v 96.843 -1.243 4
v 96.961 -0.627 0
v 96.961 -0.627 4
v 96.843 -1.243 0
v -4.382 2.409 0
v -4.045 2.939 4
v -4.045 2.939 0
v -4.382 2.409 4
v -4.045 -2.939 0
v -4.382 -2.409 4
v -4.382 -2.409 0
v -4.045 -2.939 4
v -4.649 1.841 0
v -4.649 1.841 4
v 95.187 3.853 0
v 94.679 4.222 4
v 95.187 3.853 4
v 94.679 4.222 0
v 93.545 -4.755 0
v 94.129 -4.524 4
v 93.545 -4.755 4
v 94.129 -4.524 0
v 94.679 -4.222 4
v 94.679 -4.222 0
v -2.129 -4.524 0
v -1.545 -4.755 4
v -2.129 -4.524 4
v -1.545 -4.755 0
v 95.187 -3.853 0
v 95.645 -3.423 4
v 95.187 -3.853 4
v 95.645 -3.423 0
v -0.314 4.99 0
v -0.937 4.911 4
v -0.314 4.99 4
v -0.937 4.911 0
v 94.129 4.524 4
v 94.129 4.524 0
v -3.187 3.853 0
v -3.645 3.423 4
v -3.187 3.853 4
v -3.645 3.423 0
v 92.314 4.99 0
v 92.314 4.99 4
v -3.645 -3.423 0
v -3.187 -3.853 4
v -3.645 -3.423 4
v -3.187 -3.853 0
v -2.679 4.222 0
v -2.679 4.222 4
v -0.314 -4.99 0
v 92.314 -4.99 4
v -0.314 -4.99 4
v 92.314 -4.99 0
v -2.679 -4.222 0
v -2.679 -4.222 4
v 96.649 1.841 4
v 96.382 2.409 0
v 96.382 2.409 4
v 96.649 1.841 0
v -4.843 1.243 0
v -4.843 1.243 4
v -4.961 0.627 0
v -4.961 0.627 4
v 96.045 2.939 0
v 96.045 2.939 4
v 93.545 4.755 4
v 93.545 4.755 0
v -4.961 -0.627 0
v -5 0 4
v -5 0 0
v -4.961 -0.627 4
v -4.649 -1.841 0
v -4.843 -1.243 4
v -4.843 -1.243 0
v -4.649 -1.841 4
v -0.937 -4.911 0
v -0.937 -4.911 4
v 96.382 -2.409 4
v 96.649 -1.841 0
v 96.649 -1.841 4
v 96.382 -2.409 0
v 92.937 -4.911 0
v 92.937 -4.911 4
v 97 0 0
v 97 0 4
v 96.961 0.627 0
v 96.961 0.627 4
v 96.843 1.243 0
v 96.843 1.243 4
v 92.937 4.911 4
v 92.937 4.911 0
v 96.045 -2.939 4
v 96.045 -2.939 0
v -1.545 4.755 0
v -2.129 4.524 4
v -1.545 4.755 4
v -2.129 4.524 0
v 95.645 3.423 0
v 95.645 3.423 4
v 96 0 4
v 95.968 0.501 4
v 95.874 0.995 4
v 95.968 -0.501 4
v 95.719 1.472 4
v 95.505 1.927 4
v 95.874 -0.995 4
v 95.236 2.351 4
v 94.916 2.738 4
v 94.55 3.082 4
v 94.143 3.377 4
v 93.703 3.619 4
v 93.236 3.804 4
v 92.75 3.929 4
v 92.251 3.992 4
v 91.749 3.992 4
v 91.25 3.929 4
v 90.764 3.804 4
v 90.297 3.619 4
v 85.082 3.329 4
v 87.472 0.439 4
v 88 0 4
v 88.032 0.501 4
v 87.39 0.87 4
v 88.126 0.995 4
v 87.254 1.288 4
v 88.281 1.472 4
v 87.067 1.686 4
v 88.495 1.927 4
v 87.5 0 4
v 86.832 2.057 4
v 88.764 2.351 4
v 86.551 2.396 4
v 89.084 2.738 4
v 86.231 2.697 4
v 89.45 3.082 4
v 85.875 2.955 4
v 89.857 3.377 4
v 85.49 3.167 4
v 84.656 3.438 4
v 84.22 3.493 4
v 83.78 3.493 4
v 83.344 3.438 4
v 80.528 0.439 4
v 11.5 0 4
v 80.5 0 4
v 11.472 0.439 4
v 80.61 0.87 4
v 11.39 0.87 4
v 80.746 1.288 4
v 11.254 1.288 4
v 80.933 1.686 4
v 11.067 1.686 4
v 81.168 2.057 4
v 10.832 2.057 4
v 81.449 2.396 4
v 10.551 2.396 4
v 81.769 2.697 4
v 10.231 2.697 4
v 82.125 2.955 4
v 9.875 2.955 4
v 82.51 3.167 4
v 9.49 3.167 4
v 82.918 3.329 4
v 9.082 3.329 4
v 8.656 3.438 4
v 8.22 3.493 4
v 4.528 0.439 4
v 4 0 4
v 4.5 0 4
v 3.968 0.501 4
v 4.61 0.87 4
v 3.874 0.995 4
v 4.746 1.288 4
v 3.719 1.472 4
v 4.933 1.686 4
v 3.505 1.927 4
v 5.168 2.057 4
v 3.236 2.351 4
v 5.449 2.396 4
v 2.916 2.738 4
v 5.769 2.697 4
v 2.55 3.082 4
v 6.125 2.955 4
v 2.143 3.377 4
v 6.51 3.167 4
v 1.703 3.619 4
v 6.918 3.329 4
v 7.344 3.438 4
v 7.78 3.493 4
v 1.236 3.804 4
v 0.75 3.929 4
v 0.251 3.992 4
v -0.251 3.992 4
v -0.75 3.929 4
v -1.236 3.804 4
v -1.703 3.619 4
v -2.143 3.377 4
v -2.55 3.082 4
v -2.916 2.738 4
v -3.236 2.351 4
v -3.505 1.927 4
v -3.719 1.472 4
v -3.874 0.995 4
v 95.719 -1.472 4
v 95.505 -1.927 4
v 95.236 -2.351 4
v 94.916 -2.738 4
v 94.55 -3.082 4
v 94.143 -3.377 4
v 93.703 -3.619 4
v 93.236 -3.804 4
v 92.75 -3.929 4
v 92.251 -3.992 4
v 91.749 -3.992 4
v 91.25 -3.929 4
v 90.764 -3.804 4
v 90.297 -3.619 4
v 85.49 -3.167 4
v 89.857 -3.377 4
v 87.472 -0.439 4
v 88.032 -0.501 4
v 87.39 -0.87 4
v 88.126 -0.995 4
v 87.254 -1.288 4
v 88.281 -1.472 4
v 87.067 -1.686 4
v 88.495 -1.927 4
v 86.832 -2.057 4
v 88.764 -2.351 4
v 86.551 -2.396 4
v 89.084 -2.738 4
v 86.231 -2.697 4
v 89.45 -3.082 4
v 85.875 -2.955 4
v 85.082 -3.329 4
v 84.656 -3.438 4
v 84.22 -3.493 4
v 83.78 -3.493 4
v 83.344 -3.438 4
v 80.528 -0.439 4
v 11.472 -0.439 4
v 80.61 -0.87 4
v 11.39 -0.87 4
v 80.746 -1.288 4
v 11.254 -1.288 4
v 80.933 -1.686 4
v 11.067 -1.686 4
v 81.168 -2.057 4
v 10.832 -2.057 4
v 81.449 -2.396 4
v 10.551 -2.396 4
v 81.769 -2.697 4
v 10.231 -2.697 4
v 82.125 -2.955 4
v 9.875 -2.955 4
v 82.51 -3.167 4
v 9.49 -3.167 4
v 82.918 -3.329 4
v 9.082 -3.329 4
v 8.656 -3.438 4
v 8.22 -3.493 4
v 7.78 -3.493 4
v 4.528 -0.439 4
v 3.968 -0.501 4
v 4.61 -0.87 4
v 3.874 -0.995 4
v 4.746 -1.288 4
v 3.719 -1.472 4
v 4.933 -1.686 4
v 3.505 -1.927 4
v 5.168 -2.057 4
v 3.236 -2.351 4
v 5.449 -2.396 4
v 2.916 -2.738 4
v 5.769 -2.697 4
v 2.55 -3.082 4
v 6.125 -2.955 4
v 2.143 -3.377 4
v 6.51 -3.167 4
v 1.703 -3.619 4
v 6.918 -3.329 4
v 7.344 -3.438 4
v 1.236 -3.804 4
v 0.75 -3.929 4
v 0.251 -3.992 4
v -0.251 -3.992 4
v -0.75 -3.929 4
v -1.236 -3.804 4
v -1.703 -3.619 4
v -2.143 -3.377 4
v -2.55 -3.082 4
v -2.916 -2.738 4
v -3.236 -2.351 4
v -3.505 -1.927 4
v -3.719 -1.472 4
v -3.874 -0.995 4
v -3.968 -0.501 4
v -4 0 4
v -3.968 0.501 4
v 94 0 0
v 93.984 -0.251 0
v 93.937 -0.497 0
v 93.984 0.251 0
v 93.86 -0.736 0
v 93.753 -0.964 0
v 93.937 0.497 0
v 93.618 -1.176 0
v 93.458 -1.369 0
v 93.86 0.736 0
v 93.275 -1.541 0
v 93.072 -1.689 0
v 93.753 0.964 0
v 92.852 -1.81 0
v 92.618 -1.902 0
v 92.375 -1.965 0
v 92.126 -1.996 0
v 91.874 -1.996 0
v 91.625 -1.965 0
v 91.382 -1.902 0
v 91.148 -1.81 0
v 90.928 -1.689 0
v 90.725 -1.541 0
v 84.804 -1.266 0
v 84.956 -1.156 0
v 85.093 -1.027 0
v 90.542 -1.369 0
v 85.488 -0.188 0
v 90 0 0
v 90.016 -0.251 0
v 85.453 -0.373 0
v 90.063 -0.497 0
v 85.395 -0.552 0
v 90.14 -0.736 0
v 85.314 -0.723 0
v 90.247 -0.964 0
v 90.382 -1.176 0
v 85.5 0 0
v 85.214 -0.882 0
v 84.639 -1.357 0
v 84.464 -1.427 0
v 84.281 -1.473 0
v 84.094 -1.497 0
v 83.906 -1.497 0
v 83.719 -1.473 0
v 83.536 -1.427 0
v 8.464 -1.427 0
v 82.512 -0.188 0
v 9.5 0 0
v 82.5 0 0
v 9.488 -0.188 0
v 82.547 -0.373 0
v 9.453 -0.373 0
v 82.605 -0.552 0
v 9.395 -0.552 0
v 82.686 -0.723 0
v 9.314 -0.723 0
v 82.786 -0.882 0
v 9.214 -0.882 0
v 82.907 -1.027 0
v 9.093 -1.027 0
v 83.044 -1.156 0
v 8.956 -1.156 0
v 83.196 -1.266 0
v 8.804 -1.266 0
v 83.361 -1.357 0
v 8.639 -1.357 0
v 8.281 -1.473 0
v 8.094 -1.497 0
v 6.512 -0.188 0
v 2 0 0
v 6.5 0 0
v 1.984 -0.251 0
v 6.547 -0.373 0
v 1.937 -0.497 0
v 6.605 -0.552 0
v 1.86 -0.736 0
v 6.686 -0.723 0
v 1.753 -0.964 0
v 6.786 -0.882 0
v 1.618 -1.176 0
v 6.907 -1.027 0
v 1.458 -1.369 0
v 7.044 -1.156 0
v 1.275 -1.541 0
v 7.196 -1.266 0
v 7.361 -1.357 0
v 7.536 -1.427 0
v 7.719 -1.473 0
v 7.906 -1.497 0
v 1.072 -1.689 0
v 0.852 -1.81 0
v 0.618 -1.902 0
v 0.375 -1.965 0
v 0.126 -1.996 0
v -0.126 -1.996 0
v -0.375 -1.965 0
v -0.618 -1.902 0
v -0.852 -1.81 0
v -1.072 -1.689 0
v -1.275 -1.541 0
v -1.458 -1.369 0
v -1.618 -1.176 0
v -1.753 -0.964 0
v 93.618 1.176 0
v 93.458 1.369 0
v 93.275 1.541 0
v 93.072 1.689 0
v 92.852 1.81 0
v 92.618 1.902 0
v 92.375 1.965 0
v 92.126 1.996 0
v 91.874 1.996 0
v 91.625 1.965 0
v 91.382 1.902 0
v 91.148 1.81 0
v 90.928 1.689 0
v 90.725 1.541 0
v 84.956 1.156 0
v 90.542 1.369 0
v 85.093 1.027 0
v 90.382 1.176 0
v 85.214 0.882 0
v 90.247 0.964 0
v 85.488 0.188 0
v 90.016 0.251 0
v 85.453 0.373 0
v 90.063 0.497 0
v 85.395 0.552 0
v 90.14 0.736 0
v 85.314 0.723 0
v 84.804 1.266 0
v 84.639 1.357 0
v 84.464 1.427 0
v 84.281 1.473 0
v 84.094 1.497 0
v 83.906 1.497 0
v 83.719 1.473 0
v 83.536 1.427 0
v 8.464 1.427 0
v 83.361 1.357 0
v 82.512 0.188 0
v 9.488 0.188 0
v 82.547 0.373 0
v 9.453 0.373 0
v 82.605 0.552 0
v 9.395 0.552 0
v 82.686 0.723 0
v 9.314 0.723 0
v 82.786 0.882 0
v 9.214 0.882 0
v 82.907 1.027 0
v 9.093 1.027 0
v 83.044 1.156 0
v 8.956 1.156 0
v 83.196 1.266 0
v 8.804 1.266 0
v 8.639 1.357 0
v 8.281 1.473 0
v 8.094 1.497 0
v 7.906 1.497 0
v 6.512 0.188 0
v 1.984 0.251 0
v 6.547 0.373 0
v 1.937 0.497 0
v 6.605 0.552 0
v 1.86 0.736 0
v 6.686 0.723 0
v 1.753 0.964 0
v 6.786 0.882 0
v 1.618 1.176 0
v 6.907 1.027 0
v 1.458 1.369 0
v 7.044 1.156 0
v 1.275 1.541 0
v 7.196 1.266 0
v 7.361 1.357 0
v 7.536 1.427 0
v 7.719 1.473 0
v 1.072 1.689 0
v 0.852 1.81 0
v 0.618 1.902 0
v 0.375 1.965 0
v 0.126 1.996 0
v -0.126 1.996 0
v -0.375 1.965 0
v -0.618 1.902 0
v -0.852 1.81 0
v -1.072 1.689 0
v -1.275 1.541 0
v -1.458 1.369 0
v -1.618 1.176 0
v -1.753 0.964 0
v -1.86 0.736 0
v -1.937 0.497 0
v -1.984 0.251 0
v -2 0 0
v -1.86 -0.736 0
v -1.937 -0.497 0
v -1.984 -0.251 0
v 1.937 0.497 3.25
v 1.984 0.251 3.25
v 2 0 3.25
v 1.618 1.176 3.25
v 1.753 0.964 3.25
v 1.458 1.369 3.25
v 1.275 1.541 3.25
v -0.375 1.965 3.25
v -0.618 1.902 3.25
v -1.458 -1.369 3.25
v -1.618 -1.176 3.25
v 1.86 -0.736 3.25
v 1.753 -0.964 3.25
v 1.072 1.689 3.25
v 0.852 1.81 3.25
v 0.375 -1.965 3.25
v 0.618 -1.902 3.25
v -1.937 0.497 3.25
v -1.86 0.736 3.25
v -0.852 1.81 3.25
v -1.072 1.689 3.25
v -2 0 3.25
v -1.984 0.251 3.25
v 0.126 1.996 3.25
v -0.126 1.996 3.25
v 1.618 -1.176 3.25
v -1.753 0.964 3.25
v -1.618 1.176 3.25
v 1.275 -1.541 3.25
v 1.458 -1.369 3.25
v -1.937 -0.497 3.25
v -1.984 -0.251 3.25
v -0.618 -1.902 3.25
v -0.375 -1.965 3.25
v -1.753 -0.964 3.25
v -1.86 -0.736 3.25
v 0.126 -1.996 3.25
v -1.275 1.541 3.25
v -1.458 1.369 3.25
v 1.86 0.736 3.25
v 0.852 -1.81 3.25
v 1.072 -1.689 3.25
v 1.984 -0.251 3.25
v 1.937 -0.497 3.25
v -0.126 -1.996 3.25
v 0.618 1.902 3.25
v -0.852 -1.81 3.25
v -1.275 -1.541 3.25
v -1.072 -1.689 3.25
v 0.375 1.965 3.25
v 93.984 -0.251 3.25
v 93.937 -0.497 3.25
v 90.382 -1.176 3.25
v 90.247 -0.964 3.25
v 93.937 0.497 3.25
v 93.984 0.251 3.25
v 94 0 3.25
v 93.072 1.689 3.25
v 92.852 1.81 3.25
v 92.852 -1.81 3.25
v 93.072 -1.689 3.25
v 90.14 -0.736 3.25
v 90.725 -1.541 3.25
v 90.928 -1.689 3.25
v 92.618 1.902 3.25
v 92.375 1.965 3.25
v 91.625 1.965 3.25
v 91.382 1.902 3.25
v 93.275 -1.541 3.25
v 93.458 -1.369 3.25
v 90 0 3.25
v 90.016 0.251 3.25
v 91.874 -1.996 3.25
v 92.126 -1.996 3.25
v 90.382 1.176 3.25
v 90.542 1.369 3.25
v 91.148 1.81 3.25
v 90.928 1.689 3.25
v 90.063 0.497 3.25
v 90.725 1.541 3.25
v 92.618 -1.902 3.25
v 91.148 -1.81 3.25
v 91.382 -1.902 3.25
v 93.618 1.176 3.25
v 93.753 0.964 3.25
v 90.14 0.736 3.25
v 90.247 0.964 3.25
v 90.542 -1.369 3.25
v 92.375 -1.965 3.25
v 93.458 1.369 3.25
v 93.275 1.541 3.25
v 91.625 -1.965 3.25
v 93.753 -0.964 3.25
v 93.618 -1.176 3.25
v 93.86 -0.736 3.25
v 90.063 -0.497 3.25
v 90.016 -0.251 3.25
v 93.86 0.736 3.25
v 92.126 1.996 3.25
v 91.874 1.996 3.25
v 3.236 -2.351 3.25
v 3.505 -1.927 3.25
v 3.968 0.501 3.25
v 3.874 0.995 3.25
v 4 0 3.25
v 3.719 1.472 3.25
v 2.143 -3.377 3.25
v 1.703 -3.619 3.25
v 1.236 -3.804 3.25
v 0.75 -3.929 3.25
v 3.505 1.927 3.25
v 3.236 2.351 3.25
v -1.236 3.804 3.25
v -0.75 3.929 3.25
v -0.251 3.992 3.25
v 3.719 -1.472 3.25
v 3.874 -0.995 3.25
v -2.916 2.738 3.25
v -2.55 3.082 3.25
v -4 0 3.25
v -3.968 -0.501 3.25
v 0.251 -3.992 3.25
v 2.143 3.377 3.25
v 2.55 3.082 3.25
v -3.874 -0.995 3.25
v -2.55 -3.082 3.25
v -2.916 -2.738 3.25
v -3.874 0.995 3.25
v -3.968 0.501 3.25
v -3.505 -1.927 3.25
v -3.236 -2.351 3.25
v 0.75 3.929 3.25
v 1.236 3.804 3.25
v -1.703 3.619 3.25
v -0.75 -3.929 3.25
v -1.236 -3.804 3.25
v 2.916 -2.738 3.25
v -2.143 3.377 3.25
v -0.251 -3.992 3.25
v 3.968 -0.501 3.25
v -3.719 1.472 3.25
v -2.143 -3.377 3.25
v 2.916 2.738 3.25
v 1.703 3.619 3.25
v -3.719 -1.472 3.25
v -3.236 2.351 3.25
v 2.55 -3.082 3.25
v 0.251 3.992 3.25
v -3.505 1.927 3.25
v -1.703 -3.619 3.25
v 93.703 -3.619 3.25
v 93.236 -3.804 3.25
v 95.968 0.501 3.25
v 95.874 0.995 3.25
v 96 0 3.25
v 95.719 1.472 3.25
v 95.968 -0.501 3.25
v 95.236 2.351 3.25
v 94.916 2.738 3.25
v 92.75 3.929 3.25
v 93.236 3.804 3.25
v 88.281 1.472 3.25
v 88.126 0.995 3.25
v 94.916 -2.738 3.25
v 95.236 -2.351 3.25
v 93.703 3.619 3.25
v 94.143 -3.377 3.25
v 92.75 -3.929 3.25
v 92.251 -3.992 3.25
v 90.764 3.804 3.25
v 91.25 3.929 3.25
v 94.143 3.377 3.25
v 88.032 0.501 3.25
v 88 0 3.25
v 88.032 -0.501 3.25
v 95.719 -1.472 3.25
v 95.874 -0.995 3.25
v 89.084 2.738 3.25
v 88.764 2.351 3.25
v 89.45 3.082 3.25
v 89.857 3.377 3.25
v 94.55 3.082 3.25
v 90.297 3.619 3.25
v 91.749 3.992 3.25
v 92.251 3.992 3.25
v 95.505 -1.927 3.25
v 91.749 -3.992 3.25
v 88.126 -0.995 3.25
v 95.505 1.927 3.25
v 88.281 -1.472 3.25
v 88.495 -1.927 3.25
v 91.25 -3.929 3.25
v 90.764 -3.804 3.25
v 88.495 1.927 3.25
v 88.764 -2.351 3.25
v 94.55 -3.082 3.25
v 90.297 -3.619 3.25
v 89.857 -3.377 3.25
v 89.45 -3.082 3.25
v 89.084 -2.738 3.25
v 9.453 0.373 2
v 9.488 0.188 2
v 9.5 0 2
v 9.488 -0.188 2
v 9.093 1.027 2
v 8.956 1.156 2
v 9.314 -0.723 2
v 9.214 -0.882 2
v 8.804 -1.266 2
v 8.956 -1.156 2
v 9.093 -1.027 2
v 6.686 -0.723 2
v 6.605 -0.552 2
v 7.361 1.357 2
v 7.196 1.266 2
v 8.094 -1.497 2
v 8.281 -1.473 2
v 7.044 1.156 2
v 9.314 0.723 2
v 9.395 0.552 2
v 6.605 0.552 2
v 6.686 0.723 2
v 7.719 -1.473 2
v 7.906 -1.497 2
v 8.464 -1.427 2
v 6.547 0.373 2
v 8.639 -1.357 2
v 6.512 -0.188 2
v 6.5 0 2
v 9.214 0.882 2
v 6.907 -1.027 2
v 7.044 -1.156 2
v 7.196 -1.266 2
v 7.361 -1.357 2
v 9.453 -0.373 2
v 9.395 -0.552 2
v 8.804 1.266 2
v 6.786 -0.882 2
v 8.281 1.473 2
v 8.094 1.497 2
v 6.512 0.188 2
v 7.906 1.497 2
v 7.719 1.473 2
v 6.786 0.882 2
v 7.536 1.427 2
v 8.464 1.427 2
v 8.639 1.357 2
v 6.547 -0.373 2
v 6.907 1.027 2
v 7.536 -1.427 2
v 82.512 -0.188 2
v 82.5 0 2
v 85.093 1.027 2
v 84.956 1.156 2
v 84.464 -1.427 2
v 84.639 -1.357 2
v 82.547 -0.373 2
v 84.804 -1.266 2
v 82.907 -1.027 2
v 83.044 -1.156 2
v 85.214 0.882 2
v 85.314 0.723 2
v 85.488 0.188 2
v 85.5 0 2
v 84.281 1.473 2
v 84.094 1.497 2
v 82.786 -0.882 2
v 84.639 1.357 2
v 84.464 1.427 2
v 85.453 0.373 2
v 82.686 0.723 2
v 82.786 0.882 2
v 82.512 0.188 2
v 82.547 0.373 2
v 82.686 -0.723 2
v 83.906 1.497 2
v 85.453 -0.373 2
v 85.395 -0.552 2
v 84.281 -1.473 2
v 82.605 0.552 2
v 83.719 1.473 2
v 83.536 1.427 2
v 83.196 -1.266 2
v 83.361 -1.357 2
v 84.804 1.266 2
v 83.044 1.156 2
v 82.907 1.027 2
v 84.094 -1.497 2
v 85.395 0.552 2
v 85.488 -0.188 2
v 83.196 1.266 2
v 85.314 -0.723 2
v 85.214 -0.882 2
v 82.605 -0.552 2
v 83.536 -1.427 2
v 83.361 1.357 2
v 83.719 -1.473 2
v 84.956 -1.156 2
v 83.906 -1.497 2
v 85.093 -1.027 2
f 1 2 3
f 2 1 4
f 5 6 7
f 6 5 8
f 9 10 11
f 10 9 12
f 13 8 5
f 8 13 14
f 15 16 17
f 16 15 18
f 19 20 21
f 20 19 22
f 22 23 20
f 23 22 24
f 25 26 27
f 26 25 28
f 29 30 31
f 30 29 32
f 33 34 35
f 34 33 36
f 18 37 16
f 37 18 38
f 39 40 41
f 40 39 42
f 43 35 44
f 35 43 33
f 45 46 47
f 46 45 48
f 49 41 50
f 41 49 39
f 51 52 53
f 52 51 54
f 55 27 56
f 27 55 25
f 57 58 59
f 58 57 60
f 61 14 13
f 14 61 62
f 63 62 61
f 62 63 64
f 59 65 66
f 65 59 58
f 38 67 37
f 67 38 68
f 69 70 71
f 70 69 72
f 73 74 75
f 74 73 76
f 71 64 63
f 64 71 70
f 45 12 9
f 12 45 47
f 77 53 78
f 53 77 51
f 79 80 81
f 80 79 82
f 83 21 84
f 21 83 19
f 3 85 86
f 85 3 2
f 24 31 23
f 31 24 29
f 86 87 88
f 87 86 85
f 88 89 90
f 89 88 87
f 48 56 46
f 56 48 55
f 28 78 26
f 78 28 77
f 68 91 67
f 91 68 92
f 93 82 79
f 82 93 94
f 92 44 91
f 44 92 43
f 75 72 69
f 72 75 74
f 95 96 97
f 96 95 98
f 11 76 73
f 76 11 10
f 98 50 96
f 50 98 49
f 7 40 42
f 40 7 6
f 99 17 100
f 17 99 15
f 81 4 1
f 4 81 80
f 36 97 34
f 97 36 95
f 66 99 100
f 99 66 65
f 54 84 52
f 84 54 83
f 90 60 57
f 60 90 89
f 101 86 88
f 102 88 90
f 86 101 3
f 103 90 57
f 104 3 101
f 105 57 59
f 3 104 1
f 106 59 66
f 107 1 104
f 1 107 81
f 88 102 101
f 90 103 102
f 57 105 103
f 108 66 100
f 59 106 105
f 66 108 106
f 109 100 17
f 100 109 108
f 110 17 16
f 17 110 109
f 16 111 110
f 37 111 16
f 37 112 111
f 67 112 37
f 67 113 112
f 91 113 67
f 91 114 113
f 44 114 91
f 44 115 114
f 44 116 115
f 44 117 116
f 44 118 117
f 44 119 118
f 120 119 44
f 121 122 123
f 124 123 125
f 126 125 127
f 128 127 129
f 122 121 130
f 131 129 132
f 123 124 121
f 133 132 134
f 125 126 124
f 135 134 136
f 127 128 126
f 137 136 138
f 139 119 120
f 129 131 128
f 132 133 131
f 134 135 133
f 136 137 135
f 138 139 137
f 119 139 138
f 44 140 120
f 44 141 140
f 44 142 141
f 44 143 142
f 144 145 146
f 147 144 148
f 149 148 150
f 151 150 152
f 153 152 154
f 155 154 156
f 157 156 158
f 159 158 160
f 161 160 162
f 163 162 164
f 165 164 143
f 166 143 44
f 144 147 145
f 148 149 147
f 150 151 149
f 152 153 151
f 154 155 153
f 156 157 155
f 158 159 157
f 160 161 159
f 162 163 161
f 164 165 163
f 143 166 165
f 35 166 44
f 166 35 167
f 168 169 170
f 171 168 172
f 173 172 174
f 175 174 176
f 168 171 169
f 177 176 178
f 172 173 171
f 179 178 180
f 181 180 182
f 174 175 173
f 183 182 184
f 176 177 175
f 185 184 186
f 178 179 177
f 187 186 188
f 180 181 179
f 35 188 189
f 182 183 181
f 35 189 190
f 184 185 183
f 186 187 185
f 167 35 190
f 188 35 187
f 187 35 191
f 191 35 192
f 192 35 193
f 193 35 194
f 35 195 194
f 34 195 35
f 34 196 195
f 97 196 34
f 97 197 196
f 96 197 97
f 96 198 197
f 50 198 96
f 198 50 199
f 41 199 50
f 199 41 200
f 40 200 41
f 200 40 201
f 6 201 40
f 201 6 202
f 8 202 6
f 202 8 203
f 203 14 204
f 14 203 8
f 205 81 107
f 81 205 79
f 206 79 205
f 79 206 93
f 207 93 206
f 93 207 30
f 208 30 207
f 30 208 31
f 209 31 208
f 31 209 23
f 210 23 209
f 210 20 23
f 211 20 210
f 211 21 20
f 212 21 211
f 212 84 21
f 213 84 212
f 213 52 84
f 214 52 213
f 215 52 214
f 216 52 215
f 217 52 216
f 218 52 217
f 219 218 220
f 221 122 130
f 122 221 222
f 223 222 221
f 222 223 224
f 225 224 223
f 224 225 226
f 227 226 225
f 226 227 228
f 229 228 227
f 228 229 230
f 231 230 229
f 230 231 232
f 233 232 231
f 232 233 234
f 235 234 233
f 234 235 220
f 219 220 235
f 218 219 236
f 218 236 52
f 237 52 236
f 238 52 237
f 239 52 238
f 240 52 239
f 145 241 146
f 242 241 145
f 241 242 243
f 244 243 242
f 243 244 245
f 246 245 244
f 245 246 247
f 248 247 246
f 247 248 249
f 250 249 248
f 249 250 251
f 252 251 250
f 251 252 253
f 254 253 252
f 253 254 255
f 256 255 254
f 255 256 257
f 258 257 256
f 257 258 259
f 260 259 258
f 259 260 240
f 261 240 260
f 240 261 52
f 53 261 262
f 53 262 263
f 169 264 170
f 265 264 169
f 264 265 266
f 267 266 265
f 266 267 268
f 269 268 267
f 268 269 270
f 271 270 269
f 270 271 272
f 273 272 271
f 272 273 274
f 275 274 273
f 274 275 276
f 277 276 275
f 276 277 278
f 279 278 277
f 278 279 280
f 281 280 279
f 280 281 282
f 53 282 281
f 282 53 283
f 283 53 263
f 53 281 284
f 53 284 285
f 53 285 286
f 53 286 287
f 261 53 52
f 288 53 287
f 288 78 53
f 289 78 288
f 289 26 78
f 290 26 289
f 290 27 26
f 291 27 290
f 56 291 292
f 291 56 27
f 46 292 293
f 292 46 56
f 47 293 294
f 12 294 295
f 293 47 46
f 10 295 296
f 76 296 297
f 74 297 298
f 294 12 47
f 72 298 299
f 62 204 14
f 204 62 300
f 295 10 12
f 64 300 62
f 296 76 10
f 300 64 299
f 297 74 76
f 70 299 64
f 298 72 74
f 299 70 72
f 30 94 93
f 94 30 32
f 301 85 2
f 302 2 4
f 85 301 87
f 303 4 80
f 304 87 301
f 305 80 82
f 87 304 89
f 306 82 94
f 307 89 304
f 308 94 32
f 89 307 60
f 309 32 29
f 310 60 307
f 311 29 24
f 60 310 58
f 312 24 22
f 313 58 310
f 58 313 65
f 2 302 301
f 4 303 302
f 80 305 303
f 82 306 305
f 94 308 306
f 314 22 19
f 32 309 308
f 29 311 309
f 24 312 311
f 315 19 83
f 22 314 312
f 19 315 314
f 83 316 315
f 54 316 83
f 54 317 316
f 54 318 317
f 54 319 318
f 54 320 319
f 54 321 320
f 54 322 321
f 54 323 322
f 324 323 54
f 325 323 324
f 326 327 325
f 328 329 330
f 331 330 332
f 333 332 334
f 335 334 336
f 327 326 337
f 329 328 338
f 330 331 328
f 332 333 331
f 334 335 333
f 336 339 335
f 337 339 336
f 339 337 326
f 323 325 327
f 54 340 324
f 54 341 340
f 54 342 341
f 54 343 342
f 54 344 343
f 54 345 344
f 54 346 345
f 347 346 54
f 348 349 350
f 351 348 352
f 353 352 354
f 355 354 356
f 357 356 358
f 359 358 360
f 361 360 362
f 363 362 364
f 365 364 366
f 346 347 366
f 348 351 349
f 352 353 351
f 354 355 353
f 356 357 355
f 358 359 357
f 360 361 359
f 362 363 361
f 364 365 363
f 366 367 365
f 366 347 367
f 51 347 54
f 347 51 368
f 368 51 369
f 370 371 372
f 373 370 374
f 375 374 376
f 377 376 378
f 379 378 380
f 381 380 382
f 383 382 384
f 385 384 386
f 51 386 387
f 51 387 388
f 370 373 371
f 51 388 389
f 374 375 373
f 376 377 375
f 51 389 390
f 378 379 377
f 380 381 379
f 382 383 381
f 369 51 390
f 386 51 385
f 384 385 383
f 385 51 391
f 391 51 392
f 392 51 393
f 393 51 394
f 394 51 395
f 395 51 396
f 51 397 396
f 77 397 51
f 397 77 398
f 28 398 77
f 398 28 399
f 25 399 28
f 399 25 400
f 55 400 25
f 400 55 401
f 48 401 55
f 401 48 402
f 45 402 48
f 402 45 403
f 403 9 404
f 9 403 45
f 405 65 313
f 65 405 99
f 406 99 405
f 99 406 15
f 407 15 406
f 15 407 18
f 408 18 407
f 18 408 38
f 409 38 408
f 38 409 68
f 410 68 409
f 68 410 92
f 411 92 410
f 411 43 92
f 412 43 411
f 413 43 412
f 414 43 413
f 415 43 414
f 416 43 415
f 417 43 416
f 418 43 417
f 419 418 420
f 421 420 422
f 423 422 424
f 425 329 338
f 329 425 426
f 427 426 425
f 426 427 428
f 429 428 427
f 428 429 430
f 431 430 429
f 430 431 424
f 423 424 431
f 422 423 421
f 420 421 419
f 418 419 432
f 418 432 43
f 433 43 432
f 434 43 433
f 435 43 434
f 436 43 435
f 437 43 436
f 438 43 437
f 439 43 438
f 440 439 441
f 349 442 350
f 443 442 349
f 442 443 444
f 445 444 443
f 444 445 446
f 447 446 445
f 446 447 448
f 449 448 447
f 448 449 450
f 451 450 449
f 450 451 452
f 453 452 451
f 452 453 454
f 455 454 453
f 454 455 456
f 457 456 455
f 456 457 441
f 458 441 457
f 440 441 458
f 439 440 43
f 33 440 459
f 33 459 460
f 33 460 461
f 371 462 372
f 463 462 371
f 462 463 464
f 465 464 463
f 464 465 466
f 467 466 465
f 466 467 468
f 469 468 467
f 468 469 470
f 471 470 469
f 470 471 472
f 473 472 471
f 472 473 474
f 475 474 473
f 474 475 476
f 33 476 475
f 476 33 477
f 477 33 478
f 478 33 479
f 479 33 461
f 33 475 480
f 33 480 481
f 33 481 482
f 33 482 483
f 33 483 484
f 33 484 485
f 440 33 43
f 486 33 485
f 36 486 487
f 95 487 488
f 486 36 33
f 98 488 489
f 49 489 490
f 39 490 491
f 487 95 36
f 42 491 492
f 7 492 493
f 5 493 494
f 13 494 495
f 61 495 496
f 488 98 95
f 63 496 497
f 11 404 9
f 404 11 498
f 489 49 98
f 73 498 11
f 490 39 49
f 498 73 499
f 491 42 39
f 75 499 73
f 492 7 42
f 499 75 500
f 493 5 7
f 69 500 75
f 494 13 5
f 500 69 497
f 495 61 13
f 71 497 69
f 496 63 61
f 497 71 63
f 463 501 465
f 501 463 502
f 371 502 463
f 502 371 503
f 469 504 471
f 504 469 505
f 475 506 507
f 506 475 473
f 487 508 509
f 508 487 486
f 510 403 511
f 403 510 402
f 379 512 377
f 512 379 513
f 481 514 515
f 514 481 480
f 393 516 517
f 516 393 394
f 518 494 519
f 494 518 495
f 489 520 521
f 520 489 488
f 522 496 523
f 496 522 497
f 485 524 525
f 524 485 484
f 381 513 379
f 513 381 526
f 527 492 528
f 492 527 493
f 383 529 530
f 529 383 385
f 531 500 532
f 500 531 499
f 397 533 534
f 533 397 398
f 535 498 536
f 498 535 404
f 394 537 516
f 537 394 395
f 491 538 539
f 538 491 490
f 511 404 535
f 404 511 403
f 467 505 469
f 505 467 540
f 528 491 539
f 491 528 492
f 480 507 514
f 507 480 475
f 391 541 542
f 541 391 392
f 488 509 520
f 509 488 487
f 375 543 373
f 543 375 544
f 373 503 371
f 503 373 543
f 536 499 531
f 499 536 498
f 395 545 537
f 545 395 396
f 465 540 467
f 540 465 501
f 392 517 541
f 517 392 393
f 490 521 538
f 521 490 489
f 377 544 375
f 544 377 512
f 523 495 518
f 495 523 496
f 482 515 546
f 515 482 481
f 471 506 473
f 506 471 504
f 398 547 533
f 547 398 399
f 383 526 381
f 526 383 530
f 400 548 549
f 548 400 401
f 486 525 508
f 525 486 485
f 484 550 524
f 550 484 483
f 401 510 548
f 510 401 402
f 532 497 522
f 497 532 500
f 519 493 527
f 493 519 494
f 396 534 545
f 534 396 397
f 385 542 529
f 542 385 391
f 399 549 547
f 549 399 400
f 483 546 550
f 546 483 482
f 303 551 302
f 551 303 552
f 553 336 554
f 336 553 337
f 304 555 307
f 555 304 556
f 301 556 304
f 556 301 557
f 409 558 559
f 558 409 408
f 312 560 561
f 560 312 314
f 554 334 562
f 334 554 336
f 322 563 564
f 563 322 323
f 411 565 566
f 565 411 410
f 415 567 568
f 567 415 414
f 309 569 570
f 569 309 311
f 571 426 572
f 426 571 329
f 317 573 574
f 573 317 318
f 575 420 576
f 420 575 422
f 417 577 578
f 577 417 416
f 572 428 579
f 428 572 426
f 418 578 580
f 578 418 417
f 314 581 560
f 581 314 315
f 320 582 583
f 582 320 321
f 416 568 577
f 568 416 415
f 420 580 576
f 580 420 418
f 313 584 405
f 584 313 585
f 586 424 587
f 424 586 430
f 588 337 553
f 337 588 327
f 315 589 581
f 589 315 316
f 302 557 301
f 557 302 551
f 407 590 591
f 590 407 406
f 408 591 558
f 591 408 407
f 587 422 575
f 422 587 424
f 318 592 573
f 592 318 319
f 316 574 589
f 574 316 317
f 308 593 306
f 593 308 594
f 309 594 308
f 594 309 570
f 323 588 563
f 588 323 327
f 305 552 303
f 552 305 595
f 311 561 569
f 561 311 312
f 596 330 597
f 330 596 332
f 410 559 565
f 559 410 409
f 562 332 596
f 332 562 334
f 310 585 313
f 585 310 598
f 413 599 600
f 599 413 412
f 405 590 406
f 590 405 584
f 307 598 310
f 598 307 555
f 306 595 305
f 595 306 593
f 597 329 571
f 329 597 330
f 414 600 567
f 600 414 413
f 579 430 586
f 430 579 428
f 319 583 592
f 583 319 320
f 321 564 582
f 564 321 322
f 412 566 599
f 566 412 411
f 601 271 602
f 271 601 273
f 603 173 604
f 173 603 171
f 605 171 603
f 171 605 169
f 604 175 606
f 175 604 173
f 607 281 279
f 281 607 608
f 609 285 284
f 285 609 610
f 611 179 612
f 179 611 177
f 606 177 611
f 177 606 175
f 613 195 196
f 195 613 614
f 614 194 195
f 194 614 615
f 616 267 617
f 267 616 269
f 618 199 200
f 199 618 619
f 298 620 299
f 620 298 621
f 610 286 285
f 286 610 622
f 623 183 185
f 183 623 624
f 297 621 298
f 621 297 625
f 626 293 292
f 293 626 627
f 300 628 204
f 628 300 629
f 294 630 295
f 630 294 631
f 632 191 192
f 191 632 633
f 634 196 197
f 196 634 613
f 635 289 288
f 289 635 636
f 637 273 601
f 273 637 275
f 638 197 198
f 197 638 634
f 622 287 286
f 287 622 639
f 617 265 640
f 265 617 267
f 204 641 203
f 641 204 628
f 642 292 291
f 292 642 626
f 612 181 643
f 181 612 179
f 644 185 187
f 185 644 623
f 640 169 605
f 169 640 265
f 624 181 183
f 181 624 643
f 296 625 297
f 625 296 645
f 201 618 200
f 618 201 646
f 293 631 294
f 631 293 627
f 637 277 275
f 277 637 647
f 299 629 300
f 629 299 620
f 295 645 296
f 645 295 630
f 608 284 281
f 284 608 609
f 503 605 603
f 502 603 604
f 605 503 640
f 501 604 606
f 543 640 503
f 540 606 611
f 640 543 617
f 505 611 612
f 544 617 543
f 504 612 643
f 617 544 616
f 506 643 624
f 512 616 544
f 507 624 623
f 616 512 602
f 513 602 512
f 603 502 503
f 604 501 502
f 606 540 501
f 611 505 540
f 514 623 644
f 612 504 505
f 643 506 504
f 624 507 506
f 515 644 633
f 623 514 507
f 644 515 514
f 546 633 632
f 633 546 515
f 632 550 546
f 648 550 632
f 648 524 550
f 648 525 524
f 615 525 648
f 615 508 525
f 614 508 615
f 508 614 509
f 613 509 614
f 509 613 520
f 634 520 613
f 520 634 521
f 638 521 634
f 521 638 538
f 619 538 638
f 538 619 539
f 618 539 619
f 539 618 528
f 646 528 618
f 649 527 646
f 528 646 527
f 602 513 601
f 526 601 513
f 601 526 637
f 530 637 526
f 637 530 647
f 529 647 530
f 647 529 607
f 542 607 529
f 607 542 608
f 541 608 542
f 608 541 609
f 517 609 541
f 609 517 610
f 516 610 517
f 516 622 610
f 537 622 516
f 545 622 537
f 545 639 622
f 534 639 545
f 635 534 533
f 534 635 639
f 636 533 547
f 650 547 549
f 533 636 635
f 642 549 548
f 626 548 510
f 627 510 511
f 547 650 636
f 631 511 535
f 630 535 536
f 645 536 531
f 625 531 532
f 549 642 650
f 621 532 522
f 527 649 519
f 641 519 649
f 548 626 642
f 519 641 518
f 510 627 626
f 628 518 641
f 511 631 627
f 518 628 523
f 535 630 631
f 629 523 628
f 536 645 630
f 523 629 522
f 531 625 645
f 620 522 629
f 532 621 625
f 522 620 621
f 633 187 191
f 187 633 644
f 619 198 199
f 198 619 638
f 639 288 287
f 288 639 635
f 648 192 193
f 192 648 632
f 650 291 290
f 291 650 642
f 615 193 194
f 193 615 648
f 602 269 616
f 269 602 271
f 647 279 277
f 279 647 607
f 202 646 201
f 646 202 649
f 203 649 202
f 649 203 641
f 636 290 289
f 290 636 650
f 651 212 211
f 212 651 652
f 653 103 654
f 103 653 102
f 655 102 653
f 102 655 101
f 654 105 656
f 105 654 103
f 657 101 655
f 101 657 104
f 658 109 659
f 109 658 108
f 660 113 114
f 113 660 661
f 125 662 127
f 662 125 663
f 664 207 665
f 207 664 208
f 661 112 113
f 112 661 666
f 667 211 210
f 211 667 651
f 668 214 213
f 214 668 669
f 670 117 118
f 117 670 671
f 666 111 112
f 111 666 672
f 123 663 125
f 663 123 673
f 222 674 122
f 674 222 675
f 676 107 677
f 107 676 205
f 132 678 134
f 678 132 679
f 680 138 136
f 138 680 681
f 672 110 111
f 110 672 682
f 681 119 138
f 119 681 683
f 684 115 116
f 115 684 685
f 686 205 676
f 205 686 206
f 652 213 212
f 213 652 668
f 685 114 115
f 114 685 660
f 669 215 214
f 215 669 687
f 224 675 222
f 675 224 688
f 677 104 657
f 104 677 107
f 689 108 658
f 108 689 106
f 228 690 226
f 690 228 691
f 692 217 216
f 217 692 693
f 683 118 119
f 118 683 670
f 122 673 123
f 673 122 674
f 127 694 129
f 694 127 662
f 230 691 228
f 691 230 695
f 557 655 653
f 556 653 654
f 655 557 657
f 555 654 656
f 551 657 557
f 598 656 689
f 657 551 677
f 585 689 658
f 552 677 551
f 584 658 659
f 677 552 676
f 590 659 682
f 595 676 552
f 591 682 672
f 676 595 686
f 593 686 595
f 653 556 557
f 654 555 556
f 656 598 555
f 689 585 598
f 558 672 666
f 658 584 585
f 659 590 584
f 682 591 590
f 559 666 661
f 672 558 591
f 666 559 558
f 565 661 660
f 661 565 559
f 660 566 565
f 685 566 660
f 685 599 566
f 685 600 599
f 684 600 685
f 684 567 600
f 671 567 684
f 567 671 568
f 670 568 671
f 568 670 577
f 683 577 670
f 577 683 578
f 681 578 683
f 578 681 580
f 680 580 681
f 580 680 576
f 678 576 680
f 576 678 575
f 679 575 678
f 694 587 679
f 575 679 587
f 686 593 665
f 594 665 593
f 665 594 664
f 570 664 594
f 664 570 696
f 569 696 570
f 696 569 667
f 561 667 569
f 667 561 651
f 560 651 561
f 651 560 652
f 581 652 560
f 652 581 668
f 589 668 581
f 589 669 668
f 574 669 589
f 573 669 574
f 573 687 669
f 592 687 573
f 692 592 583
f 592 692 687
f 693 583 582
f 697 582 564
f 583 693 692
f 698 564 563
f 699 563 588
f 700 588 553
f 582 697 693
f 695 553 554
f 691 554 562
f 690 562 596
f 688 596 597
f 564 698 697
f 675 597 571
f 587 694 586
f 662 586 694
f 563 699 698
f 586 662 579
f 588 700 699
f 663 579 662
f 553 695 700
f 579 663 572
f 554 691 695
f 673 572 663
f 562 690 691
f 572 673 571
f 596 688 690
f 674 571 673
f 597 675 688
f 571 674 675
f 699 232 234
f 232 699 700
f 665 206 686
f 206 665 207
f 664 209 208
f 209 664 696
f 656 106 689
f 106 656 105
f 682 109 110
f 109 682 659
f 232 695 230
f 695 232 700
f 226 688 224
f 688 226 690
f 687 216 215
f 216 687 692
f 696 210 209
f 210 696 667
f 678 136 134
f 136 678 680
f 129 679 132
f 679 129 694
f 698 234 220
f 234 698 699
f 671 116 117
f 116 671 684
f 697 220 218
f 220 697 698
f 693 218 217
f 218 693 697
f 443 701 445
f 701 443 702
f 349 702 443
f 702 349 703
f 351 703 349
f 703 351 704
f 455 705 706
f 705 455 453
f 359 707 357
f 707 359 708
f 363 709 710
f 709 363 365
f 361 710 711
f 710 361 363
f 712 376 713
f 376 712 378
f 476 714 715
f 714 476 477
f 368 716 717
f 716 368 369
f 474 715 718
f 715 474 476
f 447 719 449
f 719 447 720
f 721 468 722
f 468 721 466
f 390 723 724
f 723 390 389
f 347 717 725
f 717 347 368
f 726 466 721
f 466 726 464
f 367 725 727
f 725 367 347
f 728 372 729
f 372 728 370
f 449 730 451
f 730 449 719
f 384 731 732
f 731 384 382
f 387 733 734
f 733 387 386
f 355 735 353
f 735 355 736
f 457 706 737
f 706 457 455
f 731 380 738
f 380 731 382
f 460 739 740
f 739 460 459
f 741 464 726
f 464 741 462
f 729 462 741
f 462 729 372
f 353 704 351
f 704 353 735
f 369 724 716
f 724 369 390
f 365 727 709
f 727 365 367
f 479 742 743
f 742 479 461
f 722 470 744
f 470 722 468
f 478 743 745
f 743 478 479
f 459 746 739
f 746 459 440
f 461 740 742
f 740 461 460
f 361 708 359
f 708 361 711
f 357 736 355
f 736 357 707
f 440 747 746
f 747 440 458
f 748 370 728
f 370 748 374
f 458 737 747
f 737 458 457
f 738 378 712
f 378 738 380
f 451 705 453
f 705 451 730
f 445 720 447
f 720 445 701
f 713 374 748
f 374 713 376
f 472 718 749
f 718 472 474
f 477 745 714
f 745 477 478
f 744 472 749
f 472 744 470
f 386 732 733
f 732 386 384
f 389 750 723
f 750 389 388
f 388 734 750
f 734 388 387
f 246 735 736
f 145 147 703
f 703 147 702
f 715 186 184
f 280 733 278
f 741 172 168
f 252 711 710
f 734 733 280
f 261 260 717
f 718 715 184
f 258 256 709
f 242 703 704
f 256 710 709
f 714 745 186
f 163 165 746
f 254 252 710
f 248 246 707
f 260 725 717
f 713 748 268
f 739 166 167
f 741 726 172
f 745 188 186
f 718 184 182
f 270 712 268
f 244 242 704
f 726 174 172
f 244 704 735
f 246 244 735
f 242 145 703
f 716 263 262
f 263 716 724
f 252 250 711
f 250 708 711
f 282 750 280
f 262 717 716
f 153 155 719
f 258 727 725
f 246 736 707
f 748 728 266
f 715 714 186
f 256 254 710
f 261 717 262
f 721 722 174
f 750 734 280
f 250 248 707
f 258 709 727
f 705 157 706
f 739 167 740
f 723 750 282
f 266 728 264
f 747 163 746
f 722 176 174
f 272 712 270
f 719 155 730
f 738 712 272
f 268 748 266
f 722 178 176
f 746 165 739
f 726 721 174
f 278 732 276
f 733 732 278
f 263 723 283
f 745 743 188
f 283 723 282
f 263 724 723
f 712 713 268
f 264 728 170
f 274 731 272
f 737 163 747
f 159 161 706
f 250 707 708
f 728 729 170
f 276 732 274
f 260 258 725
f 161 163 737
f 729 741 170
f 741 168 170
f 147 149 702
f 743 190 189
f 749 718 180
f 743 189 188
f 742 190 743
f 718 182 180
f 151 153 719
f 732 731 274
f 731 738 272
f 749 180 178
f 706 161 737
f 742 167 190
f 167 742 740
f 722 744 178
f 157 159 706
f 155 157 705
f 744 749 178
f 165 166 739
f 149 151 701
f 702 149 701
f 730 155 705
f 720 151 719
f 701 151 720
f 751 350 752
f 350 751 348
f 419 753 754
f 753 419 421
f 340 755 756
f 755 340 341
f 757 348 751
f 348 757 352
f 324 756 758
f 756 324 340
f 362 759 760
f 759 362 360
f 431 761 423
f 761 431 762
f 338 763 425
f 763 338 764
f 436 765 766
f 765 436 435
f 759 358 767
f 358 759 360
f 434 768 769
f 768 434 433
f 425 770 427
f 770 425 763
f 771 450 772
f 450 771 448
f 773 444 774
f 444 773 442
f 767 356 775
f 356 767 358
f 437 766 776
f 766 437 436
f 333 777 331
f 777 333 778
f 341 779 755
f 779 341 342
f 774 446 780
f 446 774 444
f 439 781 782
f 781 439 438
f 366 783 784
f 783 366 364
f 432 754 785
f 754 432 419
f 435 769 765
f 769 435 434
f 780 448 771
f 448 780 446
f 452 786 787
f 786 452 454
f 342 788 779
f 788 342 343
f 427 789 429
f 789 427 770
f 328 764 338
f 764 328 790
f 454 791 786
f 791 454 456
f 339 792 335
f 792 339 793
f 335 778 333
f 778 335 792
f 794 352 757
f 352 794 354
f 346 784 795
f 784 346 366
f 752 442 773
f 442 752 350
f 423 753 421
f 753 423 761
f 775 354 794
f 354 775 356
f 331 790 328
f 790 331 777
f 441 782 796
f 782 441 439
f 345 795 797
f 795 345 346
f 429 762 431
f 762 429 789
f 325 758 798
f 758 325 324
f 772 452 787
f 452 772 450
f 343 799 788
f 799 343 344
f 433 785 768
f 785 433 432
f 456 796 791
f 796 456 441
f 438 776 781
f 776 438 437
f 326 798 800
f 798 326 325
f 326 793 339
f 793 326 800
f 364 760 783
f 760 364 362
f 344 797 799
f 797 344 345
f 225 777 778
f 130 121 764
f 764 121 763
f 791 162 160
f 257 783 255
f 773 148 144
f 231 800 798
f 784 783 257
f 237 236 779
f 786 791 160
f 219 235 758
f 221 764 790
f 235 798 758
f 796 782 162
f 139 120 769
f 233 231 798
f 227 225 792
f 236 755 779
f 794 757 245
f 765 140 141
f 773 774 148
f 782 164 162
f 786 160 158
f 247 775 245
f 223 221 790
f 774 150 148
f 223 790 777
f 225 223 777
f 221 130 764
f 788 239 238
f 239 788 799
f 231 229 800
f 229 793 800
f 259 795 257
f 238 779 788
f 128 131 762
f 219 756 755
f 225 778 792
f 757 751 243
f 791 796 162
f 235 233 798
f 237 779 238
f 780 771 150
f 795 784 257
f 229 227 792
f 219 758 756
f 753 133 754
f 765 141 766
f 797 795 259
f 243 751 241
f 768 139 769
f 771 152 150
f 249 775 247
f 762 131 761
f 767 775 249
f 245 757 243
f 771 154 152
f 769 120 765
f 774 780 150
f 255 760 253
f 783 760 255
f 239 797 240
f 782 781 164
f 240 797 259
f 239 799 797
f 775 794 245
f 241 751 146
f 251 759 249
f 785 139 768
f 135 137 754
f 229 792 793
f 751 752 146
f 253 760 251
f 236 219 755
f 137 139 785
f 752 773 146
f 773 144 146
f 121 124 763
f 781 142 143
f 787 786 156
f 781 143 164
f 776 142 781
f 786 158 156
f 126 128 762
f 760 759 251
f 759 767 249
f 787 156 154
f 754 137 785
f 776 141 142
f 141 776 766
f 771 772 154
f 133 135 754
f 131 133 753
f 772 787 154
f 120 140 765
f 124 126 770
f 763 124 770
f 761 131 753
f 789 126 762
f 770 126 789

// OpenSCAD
r_m3=2;
r_tete=3.5;
r_trou=1.5;
ep=4;
r_ext=5;
ecart=92;
esp_fix=8;
r_rondelle=4;

module plaque_flanc(){
	difference(){
		hull(){
		//base de la pièce
		cylinder(h=ep, r=r_ext, $fn=50);
		translate([ecart,0,0]){cylinder(h=ep, r=r_ext, $fn=50);}
		}

		//trous pour passer les molettes
		translate([0,0,-5]){cylinder(h=20, r=r_m3, $fn=50);}
		translate([ecart,0,-5]){cylinder(h=20, r=r_m3, $fn=50);}

		//encastrement rondelles d'usure
		translate([0,0,ep-0.75]){cylinder(h=5, r=r_rondelle, $fn=50);}
		translate([ecart,0,ep-0.75]){cylinder(h=5, r=r_rondelle, $fn=50);}

		//trous de vissage
		translate([esp_fix,0,-5]){cylinder(h = 20, r = r_trou, $fn=50);}
		translate([esp_fix,0,ep-2]){cylinder(h = 2, r1 = r_trou, r2=r_tete, $fn=50);}

		translate([ecart-esp_fix,0,-5]){cylinder(h = 20, r = r_trou, $fn=50);}
		translate([ecart-esp_fix,0,ep-2]){cylinder(h = 2, r1 = r_trou, r2=r_tete, $fn=50);}
		
	}

}

plaque_flanc();
